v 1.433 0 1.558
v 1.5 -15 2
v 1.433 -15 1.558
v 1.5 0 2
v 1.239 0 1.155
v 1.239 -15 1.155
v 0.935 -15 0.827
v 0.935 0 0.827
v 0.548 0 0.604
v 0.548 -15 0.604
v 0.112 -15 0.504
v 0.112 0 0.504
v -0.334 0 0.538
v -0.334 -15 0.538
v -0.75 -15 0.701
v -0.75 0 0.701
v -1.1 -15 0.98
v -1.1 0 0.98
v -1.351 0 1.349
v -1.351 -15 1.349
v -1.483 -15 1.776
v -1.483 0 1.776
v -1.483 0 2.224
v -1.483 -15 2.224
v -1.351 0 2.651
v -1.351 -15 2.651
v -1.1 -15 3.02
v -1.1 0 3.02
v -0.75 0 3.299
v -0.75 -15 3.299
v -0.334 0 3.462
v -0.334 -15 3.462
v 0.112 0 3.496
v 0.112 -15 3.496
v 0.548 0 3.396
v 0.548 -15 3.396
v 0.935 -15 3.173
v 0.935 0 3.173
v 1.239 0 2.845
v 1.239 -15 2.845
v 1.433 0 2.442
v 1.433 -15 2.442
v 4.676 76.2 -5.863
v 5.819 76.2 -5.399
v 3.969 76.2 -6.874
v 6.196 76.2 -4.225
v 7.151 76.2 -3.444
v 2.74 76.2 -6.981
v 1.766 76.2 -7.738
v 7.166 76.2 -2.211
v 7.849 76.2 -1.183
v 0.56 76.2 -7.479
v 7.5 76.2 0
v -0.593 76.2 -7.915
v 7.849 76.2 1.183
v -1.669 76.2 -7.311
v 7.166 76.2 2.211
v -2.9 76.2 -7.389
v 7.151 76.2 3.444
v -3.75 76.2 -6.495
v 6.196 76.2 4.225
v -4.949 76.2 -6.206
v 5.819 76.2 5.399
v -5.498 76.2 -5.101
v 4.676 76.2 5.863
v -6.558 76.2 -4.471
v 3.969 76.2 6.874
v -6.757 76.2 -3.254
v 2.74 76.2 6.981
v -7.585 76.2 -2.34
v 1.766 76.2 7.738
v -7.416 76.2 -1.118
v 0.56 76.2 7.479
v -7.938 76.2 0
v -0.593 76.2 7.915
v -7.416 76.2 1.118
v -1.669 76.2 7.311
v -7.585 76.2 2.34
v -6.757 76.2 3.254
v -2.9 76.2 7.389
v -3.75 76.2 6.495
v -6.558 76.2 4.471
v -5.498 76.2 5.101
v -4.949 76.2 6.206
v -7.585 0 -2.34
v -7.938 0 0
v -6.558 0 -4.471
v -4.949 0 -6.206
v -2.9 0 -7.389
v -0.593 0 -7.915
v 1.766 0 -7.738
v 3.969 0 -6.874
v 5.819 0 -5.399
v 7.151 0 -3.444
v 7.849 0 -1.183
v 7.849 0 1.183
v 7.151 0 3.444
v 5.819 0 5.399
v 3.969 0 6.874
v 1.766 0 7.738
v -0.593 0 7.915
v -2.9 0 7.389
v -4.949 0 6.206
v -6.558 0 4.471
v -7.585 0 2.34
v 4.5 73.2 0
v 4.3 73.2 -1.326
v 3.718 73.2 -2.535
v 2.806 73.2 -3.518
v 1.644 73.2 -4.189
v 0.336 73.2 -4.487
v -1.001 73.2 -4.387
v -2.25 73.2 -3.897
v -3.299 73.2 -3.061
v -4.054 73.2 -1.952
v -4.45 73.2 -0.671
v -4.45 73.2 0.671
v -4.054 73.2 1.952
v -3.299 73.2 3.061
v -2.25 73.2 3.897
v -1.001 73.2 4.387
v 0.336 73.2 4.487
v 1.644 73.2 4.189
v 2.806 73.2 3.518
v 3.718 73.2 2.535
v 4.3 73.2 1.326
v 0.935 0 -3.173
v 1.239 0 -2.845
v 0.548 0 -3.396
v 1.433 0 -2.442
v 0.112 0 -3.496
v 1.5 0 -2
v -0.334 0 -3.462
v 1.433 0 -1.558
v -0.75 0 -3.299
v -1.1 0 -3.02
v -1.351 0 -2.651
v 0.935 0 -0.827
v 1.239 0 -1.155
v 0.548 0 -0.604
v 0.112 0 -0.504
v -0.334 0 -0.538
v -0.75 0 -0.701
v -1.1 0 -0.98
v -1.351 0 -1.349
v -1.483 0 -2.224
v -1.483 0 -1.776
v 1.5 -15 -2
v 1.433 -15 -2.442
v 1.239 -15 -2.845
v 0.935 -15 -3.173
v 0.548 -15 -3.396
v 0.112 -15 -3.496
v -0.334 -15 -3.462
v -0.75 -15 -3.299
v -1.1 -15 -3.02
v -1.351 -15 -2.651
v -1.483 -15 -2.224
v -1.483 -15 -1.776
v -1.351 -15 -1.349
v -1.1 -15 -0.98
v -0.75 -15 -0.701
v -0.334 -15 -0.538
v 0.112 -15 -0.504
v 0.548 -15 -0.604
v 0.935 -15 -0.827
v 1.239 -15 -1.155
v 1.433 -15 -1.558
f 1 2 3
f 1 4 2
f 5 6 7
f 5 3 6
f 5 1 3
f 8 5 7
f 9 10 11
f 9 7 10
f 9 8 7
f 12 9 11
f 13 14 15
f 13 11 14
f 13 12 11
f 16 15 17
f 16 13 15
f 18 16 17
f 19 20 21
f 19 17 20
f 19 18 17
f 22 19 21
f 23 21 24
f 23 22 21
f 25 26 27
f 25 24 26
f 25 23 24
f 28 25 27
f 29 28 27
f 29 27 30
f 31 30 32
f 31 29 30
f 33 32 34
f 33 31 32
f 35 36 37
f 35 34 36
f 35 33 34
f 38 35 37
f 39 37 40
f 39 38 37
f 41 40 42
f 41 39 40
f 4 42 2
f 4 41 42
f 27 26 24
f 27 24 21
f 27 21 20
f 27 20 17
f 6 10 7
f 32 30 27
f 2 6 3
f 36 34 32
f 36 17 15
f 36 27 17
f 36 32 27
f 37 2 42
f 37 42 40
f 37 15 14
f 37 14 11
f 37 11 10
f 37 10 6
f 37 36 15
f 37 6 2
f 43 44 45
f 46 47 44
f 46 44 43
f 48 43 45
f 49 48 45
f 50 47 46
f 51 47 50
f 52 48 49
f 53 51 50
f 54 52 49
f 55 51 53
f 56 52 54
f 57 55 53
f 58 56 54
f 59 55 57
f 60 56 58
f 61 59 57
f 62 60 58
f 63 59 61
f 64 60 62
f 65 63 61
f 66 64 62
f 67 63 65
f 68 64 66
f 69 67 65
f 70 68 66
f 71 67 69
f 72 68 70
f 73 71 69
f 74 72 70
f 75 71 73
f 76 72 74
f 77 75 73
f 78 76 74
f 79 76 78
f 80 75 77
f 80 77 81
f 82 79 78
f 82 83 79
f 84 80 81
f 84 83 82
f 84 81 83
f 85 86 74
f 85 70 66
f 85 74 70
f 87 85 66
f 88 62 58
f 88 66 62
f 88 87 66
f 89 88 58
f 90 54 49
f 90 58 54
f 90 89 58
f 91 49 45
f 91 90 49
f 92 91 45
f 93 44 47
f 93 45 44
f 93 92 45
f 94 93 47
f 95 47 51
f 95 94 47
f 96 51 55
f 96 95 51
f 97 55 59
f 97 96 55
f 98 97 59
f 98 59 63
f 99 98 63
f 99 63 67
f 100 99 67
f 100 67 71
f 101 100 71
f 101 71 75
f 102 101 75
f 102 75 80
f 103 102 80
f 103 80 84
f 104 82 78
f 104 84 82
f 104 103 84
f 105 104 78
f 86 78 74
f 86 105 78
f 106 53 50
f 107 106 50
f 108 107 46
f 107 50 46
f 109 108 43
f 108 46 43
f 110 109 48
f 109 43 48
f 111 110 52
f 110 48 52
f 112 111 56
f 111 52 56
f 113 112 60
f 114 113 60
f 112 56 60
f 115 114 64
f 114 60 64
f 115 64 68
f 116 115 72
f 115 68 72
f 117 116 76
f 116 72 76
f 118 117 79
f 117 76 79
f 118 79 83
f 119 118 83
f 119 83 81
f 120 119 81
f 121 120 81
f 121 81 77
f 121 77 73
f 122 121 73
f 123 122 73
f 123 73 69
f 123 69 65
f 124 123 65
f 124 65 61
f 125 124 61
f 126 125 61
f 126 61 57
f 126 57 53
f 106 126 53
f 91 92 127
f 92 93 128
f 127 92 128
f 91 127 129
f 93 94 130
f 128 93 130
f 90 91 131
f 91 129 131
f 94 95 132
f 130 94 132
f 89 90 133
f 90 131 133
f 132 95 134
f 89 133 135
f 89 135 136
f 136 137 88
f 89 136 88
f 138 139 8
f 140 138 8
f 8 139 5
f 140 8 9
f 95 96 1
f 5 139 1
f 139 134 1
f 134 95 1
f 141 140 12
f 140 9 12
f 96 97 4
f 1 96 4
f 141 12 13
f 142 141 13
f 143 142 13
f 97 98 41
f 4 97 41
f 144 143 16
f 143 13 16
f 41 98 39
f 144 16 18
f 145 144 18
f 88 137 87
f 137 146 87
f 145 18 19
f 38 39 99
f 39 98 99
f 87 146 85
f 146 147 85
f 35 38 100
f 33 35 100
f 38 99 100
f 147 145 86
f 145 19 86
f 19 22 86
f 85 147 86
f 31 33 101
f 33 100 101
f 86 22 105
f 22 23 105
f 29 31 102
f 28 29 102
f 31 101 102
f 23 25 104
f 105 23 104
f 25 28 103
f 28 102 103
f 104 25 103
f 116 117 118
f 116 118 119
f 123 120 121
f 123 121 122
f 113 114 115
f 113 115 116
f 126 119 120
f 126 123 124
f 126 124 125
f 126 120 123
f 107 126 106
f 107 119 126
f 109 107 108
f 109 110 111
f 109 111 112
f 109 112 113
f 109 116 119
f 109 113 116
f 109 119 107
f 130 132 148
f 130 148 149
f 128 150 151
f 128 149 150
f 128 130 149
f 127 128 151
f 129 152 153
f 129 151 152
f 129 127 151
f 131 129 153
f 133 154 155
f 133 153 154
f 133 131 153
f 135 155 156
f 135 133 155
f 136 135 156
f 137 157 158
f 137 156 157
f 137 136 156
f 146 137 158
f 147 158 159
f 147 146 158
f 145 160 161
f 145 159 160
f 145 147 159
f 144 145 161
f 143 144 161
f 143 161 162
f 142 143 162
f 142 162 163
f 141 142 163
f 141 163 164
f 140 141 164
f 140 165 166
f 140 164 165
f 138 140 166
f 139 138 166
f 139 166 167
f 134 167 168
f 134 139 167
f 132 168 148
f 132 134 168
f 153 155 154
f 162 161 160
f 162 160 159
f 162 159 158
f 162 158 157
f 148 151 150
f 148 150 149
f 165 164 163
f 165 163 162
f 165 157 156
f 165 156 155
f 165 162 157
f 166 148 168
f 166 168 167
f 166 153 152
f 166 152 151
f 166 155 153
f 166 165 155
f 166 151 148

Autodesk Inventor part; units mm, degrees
ref_plane "YZ Plane" through (0, 0, 0) normal (1, 0, 0) x (0, 1, 0)
ref_plane "XZ Plane" through (0, 0, 0) normal (0, 1, 0) x (-1, 0, 0)
ref_plane "XY Plane" through (0, 0, 0) normal (0, 0, 1) x (1, 0, 0)
sketch "Sketch1" plane through (0, 0, 0) normal (0, 1, 0) x (-1, 0, 0)
  circle A0 centre (0, 0) radius 7.9375
  dimension "d0" = 15.875
extrude "Extrusion1" add sketch "Sketch1" along normal blind 76.2
sketch "Sketch2" plane through (0, 76.2, 0) normal (0, 1, 0) x (1, 0, 0)
  circle A0 centre (0, 0) radius 4.5
  dimension "d3" = 9
extrude "Extrusion2" cut sketch "Sketch2" against normal blind 3
chamfer "Chamfer1" distance 3 angle 45 1 edges at (-4.5, 76.2, 0)
sketch "Sketch3" plane through (0, 0, 0) normal (0, -1, 0) x (1, 0, 0)
  circle A0 centre (0, 2) radius 1.5
  circle A1 centre (0, -2) radius 1.5
  point P0 (0, 0)
  dimension "d9" = 3
  dimension "d10" = 3
  dimension "d11" = 2
  dimension "d12" = 2
extrude "Extrusion3" add sketch "Sketch3" along normal blind 15
properties part number "Heater630W" material "Steel, Alloy"
